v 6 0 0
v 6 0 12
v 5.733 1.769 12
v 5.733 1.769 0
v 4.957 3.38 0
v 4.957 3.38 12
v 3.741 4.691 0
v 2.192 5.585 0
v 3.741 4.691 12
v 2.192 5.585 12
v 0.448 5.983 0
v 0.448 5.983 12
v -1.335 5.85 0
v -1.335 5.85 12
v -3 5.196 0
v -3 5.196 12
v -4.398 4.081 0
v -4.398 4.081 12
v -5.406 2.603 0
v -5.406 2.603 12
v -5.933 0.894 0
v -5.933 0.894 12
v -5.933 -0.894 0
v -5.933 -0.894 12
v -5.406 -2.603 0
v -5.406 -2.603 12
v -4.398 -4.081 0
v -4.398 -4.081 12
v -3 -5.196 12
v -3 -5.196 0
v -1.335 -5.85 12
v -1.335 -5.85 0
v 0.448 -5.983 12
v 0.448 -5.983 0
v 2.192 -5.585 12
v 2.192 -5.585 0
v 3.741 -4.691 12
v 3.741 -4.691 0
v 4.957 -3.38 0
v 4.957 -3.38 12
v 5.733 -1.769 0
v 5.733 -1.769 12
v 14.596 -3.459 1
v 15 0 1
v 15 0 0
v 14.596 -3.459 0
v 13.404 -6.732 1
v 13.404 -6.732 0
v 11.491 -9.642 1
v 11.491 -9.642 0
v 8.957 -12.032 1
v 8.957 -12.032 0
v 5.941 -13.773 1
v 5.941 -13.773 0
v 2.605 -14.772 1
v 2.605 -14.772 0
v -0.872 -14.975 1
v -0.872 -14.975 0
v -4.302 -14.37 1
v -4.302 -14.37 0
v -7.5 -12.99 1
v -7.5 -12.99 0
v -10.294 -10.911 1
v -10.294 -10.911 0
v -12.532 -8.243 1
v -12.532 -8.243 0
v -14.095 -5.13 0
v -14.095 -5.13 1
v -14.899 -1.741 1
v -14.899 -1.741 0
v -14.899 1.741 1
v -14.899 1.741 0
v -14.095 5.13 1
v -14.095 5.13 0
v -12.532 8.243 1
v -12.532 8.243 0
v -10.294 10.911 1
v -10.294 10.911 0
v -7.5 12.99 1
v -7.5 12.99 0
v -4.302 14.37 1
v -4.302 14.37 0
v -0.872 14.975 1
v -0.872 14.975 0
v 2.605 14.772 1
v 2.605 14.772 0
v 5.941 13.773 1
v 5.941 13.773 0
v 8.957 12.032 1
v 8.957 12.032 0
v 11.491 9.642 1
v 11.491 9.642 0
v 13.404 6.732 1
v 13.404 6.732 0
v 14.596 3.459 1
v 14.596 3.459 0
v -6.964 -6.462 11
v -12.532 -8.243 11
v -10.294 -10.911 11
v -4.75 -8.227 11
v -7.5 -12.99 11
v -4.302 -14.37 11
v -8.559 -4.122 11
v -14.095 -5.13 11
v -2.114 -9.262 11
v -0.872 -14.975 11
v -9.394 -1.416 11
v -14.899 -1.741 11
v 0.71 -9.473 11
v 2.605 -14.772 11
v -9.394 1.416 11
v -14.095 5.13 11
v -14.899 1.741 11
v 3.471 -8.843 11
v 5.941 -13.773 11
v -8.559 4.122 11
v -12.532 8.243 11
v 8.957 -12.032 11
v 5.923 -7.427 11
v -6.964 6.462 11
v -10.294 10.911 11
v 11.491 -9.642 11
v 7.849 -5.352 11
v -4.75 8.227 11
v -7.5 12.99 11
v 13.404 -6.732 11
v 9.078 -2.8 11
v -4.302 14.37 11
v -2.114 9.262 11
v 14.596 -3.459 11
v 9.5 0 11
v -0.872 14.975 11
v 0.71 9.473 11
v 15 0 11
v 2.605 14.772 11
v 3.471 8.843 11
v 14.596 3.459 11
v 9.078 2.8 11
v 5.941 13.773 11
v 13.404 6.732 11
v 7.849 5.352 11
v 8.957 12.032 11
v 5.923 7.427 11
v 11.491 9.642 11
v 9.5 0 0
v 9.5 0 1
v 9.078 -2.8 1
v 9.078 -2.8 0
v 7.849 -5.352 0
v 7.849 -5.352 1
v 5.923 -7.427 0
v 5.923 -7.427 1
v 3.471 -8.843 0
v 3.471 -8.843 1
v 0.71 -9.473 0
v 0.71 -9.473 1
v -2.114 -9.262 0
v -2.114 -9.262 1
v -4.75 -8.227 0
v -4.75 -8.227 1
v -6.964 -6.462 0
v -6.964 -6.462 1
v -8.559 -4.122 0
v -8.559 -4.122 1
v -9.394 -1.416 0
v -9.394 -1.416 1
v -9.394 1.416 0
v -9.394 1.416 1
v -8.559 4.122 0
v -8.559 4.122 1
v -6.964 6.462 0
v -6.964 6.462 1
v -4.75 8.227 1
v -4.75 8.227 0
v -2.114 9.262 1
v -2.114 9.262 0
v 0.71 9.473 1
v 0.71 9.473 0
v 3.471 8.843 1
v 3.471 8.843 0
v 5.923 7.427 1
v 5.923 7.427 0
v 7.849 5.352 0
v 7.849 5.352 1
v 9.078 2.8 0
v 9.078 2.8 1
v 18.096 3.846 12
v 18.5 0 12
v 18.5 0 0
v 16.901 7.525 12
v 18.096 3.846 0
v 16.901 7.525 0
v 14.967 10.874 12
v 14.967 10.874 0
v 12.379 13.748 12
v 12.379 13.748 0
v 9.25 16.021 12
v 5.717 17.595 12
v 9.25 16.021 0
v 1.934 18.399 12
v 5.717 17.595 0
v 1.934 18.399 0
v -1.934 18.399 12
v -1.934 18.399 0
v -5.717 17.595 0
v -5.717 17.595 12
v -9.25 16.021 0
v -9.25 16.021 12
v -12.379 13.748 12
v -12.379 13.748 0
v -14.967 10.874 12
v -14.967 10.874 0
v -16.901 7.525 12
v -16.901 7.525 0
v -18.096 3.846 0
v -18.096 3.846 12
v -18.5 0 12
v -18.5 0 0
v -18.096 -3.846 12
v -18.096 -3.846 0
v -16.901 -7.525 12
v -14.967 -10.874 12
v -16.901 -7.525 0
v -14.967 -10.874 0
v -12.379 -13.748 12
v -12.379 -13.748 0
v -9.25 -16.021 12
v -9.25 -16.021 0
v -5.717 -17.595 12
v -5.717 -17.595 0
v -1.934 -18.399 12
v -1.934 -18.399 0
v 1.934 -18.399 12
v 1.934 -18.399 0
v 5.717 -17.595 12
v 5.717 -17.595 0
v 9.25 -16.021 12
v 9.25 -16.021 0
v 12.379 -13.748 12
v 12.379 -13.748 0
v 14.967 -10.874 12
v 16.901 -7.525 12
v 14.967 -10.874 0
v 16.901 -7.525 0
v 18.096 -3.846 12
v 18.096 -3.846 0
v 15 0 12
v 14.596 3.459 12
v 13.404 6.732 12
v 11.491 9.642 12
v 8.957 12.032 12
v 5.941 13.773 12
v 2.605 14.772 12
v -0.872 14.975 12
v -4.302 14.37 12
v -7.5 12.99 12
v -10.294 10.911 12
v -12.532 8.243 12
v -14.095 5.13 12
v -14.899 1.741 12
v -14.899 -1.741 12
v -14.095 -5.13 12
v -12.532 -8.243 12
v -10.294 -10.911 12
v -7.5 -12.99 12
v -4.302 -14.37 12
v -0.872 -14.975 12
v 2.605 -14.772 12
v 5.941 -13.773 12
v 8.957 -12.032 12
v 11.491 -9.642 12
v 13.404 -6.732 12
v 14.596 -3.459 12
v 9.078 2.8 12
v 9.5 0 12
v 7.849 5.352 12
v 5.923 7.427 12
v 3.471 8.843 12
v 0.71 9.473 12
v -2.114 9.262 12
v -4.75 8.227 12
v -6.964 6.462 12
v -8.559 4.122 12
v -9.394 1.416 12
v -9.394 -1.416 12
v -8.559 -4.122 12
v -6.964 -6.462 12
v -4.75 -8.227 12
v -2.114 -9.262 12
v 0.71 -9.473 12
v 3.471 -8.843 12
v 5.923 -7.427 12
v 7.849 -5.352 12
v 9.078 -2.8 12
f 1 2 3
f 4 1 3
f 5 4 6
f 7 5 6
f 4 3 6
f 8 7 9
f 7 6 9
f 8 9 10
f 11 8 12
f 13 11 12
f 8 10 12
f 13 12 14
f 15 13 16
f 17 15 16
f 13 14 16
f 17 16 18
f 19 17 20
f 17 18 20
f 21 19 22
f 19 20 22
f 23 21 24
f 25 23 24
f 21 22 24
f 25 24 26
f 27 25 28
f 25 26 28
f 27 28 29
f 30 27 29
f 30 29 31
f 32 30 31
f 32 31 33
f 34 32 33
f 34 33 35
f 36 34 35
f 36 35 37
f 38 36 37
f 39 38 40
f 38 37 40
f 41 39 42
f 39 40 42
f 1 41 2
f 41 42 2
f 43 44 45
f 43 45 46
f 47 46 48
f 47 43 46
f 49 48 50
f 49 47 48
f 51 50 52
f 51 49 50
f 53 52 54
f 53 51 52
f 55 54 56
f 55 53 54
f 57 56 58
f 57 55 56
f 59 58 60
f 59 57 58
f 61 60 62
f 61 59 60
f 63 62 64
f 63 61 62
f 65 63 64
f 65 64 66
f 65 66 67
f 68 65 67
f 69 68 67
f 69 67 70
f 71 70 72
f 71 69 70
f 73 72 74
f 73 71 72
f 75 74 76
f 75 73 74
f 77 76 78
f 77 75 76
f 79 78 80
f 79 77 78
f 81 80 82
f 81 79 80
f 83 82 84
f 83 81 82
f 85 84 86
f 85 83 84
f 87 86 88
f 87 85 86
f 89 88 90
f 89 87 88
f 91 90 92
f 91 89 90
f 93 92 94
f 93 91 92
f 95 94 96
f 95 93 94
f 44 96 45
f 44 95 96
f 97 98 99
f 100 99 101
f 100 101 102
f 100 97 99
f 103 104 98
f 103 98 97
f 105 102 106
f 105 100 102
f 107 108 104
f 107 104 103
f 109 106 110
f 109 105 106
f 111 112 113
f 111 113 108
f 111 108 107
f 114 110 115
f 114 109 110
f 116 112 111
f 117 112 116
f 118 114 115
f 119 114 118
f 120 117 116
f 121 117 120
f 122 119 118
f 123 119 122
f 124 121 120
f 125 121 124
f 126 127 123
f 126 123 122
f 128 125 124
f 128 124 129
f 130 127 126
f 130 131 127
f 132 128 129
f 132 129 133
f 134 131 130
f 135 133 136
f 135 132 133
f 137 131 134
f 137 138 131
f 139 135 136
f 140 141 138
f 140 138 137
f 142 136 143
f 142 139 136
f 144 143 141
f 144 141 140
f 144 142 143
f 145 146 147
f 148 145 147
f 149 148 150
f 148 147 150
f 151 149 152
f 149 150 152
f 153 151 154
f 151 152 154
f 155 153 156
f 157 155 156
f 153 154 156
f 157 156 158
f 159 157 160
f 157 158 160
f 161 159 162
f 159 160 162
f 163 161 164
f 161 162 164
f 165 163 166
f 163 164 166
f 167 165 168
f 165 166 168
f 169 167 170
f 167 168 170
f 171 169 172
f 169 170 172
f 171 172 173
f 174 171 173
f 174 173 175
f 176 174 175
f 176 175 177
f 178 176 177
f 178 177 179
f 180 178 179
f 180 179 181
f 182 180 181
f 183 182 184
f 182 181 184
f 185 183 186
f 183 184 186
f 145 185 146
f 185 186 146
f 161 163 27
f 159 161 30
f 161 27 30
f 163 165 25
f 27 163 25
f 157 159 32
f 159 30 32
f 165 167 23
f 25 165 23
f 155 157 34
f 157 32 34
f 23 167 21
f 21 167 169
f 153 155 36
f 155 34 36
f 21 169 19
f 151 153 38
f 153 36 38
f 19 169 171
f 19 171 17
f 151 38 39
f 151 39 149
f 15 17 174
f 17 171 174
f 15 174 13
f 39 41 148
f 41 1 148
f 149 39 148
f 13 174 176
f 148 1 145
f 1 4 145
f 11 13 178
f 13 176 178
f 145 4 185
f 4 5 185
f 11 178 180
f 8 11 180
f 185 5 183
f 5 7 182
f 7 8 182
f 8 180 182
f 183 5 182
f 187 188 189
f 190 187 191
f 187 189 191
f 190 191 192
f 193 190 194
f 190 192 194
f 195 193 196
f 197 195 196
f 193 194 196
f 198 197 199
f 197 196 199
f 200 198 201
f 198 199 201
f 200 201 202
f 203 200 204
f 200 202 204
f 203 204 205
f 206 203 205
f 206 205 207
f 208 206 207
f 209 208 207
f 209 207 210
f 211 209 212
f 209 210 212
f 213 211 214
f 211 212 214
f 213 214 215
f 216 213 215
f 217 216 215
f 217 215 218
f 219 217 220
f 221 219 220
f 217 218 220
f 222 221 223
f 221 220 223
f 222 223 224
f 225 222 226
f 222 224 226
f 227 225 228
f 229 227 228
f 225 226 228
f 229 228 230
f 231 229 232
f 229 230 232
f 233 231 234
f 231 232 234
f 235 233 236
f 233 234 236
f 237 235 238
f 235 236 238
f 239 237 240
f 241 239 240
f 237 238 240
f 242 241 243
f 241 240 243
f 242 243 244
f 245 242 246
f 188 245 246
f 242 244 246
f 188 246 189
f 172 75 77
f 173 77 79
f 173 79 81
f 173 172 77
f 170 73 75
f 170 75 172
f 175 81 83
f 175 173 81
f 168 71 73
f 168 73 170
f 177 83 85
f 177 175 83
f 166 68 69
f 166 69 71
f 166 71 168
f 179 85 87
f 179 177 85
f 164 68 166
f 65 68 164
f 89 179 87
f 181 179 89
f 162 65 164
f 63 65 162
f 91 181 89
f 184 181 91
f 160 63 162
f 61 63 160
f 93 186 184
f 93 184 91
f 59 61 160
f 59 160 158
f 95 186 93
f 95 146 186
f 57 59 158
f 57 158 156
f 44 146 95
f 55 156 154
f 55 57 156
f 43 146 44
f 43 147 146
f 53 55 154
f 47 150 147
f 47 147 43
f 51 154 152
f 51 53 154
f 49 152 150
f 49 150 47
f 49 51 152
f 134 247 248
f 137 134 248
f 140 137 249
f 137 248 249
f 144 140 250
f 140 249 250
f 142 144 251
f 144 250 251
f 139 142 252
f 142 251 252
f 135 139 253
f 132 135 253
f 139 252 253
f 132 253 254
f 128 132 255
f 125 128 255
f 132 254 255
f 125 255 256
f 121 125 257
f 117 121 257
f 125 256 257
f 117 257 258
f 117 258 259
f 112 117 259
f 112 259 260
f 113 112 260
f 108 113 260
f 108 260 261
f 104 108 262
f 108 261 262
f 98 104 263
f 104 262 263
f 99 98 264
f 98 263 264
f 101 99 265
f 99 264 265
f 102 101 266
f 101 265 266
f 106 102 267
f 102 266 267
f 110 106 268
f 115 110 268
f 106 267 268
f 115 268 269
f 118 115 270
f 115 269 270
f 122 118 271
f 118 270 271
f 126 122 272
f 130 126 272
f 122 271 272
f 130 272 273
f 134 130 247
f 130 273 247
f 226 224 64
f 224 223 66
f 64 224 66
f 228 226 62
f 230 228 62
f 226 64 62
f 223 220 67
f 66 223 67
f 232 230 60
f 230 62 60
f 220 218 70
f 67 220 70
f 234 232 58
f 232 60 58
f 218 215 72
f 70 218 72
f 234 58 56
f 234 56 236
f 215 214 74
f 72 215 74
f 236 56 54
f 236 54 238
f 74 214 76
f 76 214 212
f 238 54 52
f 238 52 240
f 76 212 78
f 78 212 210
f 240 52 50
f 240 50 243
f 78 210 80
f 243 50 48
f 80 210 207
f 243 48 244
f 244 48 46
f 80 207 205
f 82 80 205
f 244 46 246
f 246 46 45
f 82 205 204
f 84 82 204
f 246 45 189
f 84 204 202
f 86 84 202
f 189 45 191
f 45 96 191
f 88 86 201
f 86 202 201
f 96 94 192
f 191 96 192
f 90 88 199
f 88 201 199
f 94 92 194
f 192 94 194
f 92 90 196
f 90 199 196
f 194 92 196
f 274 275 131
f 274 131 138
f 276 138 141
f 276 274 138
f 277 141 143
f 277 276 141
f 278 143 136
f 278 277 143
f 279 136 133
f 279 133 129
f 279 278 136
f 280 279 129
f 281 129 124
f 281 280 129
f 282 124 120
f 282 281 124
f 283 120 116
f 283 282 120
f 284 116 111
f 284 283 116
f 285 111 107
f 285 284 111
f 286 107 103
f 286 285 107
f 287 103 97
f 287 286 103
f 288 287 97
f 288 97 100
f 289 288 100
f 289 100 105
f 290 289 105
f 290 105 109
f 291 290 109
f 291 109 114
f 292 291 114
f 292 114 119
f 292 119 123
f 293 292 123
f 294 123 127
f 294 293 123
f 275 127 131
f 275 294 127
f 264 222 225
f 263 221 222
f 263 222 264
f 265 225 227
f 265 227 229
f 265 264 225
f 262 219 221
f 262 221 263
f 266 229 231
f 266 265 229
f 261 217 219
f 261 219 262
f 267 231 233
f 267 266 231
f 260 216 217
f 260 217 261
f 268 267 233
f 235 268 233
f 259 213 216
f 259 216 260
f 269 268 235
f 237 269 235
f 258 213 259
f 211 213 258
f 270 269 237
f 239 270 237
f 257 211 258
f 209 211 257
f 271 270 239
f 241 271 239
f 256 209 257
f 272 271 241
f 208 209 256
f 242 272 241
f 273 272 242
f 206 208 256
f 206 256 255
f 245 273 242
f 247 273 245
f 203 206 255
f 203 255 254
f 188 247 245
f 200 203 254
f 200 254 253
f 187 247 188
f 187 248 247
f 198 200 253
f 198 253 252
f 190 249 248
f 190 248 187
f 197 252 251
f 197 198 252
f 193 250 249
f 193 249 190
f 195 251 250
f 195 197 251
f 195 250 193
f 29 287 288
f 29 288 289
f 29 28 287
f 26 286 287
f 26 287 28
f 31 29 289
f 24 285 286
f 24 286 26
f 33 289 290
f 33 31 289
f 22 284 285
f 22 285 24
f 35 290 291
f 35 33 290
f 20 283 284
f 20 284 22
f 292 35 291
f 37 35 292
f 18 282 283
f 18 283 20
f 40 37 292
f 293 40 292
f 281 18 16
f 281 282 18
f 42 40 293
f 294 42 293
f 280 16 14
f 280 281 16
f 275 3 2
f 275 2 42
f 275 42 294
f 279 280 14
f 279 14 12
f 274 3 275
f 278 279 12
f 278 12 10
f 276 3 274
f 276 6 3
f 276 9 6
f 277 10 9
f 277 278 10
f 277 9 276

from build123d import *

# Parameters (mm, degrees)
SKETCH1_R           = 18.5
BOSS_EXTRUDE1_DEPTH = 12
SKETCH2_R           = 6
CUT_EXTRUDE1_DEPTH  = 12
SKETCH3_R           = 15
SKETCH3_R_2         = 9.5
CUT_EXTRUDE2_DEPTH  = 1
CUT_EXTRUDE3_START  = -1
SKETCH4_R           = 15
SKETCH4_R_2         = 9.5
CUT_EXTRUDE3_DEPTH  = 1


with BuildPart() as part:
    # Sketch1 → Boss-Extrude1 (new body)
    with BuildSketch(Plane.XY):
        Circle(SKETCH1_R)
    extrude(amount=BOSS_EXTRUDE1_DEPTH)

    # Sketch2 → Cut-Extrude1 (cut)
    with BuildSketch(Plane.XY.offset(12)):
        Circle(SKETCH2_R)
    extrude(amount=-CUT_EXTRUDE1_DEPTH, mode=Mode.SUBTRACT)

    # Sketch3 → Cut-Extrude2 (cut)
    with BuildSketch(Plane.XY.offset(12)):
        Circle(SKETCH3_R)
        Circle(SKETCH3_R_2, mode=Mode.SUBTRACT)
    extrude(amount=-CUT_EXTRUDE2_DEPTH, mode=Mode.SUBTRACT)

    # Sketch4 → Cut-Extrude3 (cut)
    with BuildSketch(Plane(origin=(0, 0, 0), x_dir=(-1, 0, 0), z_dir=(0, 0, -1)).offset(CUT_EXTRUDE3_START)):
        with Locations(Location((0, 0, 0), (0, 0, 180))):
            Circle(SKETCH4_R)
        with Locations(Location((0, 0, 0), (0, 0, 180))):
            Circle(SKETCH4_R_2, mode=Mode.SUBTRACT)
    extrude(amount=CUT_EXTRUDE3_DEPTH, mode=Mode.SUBTRACT)


solid = part.part
